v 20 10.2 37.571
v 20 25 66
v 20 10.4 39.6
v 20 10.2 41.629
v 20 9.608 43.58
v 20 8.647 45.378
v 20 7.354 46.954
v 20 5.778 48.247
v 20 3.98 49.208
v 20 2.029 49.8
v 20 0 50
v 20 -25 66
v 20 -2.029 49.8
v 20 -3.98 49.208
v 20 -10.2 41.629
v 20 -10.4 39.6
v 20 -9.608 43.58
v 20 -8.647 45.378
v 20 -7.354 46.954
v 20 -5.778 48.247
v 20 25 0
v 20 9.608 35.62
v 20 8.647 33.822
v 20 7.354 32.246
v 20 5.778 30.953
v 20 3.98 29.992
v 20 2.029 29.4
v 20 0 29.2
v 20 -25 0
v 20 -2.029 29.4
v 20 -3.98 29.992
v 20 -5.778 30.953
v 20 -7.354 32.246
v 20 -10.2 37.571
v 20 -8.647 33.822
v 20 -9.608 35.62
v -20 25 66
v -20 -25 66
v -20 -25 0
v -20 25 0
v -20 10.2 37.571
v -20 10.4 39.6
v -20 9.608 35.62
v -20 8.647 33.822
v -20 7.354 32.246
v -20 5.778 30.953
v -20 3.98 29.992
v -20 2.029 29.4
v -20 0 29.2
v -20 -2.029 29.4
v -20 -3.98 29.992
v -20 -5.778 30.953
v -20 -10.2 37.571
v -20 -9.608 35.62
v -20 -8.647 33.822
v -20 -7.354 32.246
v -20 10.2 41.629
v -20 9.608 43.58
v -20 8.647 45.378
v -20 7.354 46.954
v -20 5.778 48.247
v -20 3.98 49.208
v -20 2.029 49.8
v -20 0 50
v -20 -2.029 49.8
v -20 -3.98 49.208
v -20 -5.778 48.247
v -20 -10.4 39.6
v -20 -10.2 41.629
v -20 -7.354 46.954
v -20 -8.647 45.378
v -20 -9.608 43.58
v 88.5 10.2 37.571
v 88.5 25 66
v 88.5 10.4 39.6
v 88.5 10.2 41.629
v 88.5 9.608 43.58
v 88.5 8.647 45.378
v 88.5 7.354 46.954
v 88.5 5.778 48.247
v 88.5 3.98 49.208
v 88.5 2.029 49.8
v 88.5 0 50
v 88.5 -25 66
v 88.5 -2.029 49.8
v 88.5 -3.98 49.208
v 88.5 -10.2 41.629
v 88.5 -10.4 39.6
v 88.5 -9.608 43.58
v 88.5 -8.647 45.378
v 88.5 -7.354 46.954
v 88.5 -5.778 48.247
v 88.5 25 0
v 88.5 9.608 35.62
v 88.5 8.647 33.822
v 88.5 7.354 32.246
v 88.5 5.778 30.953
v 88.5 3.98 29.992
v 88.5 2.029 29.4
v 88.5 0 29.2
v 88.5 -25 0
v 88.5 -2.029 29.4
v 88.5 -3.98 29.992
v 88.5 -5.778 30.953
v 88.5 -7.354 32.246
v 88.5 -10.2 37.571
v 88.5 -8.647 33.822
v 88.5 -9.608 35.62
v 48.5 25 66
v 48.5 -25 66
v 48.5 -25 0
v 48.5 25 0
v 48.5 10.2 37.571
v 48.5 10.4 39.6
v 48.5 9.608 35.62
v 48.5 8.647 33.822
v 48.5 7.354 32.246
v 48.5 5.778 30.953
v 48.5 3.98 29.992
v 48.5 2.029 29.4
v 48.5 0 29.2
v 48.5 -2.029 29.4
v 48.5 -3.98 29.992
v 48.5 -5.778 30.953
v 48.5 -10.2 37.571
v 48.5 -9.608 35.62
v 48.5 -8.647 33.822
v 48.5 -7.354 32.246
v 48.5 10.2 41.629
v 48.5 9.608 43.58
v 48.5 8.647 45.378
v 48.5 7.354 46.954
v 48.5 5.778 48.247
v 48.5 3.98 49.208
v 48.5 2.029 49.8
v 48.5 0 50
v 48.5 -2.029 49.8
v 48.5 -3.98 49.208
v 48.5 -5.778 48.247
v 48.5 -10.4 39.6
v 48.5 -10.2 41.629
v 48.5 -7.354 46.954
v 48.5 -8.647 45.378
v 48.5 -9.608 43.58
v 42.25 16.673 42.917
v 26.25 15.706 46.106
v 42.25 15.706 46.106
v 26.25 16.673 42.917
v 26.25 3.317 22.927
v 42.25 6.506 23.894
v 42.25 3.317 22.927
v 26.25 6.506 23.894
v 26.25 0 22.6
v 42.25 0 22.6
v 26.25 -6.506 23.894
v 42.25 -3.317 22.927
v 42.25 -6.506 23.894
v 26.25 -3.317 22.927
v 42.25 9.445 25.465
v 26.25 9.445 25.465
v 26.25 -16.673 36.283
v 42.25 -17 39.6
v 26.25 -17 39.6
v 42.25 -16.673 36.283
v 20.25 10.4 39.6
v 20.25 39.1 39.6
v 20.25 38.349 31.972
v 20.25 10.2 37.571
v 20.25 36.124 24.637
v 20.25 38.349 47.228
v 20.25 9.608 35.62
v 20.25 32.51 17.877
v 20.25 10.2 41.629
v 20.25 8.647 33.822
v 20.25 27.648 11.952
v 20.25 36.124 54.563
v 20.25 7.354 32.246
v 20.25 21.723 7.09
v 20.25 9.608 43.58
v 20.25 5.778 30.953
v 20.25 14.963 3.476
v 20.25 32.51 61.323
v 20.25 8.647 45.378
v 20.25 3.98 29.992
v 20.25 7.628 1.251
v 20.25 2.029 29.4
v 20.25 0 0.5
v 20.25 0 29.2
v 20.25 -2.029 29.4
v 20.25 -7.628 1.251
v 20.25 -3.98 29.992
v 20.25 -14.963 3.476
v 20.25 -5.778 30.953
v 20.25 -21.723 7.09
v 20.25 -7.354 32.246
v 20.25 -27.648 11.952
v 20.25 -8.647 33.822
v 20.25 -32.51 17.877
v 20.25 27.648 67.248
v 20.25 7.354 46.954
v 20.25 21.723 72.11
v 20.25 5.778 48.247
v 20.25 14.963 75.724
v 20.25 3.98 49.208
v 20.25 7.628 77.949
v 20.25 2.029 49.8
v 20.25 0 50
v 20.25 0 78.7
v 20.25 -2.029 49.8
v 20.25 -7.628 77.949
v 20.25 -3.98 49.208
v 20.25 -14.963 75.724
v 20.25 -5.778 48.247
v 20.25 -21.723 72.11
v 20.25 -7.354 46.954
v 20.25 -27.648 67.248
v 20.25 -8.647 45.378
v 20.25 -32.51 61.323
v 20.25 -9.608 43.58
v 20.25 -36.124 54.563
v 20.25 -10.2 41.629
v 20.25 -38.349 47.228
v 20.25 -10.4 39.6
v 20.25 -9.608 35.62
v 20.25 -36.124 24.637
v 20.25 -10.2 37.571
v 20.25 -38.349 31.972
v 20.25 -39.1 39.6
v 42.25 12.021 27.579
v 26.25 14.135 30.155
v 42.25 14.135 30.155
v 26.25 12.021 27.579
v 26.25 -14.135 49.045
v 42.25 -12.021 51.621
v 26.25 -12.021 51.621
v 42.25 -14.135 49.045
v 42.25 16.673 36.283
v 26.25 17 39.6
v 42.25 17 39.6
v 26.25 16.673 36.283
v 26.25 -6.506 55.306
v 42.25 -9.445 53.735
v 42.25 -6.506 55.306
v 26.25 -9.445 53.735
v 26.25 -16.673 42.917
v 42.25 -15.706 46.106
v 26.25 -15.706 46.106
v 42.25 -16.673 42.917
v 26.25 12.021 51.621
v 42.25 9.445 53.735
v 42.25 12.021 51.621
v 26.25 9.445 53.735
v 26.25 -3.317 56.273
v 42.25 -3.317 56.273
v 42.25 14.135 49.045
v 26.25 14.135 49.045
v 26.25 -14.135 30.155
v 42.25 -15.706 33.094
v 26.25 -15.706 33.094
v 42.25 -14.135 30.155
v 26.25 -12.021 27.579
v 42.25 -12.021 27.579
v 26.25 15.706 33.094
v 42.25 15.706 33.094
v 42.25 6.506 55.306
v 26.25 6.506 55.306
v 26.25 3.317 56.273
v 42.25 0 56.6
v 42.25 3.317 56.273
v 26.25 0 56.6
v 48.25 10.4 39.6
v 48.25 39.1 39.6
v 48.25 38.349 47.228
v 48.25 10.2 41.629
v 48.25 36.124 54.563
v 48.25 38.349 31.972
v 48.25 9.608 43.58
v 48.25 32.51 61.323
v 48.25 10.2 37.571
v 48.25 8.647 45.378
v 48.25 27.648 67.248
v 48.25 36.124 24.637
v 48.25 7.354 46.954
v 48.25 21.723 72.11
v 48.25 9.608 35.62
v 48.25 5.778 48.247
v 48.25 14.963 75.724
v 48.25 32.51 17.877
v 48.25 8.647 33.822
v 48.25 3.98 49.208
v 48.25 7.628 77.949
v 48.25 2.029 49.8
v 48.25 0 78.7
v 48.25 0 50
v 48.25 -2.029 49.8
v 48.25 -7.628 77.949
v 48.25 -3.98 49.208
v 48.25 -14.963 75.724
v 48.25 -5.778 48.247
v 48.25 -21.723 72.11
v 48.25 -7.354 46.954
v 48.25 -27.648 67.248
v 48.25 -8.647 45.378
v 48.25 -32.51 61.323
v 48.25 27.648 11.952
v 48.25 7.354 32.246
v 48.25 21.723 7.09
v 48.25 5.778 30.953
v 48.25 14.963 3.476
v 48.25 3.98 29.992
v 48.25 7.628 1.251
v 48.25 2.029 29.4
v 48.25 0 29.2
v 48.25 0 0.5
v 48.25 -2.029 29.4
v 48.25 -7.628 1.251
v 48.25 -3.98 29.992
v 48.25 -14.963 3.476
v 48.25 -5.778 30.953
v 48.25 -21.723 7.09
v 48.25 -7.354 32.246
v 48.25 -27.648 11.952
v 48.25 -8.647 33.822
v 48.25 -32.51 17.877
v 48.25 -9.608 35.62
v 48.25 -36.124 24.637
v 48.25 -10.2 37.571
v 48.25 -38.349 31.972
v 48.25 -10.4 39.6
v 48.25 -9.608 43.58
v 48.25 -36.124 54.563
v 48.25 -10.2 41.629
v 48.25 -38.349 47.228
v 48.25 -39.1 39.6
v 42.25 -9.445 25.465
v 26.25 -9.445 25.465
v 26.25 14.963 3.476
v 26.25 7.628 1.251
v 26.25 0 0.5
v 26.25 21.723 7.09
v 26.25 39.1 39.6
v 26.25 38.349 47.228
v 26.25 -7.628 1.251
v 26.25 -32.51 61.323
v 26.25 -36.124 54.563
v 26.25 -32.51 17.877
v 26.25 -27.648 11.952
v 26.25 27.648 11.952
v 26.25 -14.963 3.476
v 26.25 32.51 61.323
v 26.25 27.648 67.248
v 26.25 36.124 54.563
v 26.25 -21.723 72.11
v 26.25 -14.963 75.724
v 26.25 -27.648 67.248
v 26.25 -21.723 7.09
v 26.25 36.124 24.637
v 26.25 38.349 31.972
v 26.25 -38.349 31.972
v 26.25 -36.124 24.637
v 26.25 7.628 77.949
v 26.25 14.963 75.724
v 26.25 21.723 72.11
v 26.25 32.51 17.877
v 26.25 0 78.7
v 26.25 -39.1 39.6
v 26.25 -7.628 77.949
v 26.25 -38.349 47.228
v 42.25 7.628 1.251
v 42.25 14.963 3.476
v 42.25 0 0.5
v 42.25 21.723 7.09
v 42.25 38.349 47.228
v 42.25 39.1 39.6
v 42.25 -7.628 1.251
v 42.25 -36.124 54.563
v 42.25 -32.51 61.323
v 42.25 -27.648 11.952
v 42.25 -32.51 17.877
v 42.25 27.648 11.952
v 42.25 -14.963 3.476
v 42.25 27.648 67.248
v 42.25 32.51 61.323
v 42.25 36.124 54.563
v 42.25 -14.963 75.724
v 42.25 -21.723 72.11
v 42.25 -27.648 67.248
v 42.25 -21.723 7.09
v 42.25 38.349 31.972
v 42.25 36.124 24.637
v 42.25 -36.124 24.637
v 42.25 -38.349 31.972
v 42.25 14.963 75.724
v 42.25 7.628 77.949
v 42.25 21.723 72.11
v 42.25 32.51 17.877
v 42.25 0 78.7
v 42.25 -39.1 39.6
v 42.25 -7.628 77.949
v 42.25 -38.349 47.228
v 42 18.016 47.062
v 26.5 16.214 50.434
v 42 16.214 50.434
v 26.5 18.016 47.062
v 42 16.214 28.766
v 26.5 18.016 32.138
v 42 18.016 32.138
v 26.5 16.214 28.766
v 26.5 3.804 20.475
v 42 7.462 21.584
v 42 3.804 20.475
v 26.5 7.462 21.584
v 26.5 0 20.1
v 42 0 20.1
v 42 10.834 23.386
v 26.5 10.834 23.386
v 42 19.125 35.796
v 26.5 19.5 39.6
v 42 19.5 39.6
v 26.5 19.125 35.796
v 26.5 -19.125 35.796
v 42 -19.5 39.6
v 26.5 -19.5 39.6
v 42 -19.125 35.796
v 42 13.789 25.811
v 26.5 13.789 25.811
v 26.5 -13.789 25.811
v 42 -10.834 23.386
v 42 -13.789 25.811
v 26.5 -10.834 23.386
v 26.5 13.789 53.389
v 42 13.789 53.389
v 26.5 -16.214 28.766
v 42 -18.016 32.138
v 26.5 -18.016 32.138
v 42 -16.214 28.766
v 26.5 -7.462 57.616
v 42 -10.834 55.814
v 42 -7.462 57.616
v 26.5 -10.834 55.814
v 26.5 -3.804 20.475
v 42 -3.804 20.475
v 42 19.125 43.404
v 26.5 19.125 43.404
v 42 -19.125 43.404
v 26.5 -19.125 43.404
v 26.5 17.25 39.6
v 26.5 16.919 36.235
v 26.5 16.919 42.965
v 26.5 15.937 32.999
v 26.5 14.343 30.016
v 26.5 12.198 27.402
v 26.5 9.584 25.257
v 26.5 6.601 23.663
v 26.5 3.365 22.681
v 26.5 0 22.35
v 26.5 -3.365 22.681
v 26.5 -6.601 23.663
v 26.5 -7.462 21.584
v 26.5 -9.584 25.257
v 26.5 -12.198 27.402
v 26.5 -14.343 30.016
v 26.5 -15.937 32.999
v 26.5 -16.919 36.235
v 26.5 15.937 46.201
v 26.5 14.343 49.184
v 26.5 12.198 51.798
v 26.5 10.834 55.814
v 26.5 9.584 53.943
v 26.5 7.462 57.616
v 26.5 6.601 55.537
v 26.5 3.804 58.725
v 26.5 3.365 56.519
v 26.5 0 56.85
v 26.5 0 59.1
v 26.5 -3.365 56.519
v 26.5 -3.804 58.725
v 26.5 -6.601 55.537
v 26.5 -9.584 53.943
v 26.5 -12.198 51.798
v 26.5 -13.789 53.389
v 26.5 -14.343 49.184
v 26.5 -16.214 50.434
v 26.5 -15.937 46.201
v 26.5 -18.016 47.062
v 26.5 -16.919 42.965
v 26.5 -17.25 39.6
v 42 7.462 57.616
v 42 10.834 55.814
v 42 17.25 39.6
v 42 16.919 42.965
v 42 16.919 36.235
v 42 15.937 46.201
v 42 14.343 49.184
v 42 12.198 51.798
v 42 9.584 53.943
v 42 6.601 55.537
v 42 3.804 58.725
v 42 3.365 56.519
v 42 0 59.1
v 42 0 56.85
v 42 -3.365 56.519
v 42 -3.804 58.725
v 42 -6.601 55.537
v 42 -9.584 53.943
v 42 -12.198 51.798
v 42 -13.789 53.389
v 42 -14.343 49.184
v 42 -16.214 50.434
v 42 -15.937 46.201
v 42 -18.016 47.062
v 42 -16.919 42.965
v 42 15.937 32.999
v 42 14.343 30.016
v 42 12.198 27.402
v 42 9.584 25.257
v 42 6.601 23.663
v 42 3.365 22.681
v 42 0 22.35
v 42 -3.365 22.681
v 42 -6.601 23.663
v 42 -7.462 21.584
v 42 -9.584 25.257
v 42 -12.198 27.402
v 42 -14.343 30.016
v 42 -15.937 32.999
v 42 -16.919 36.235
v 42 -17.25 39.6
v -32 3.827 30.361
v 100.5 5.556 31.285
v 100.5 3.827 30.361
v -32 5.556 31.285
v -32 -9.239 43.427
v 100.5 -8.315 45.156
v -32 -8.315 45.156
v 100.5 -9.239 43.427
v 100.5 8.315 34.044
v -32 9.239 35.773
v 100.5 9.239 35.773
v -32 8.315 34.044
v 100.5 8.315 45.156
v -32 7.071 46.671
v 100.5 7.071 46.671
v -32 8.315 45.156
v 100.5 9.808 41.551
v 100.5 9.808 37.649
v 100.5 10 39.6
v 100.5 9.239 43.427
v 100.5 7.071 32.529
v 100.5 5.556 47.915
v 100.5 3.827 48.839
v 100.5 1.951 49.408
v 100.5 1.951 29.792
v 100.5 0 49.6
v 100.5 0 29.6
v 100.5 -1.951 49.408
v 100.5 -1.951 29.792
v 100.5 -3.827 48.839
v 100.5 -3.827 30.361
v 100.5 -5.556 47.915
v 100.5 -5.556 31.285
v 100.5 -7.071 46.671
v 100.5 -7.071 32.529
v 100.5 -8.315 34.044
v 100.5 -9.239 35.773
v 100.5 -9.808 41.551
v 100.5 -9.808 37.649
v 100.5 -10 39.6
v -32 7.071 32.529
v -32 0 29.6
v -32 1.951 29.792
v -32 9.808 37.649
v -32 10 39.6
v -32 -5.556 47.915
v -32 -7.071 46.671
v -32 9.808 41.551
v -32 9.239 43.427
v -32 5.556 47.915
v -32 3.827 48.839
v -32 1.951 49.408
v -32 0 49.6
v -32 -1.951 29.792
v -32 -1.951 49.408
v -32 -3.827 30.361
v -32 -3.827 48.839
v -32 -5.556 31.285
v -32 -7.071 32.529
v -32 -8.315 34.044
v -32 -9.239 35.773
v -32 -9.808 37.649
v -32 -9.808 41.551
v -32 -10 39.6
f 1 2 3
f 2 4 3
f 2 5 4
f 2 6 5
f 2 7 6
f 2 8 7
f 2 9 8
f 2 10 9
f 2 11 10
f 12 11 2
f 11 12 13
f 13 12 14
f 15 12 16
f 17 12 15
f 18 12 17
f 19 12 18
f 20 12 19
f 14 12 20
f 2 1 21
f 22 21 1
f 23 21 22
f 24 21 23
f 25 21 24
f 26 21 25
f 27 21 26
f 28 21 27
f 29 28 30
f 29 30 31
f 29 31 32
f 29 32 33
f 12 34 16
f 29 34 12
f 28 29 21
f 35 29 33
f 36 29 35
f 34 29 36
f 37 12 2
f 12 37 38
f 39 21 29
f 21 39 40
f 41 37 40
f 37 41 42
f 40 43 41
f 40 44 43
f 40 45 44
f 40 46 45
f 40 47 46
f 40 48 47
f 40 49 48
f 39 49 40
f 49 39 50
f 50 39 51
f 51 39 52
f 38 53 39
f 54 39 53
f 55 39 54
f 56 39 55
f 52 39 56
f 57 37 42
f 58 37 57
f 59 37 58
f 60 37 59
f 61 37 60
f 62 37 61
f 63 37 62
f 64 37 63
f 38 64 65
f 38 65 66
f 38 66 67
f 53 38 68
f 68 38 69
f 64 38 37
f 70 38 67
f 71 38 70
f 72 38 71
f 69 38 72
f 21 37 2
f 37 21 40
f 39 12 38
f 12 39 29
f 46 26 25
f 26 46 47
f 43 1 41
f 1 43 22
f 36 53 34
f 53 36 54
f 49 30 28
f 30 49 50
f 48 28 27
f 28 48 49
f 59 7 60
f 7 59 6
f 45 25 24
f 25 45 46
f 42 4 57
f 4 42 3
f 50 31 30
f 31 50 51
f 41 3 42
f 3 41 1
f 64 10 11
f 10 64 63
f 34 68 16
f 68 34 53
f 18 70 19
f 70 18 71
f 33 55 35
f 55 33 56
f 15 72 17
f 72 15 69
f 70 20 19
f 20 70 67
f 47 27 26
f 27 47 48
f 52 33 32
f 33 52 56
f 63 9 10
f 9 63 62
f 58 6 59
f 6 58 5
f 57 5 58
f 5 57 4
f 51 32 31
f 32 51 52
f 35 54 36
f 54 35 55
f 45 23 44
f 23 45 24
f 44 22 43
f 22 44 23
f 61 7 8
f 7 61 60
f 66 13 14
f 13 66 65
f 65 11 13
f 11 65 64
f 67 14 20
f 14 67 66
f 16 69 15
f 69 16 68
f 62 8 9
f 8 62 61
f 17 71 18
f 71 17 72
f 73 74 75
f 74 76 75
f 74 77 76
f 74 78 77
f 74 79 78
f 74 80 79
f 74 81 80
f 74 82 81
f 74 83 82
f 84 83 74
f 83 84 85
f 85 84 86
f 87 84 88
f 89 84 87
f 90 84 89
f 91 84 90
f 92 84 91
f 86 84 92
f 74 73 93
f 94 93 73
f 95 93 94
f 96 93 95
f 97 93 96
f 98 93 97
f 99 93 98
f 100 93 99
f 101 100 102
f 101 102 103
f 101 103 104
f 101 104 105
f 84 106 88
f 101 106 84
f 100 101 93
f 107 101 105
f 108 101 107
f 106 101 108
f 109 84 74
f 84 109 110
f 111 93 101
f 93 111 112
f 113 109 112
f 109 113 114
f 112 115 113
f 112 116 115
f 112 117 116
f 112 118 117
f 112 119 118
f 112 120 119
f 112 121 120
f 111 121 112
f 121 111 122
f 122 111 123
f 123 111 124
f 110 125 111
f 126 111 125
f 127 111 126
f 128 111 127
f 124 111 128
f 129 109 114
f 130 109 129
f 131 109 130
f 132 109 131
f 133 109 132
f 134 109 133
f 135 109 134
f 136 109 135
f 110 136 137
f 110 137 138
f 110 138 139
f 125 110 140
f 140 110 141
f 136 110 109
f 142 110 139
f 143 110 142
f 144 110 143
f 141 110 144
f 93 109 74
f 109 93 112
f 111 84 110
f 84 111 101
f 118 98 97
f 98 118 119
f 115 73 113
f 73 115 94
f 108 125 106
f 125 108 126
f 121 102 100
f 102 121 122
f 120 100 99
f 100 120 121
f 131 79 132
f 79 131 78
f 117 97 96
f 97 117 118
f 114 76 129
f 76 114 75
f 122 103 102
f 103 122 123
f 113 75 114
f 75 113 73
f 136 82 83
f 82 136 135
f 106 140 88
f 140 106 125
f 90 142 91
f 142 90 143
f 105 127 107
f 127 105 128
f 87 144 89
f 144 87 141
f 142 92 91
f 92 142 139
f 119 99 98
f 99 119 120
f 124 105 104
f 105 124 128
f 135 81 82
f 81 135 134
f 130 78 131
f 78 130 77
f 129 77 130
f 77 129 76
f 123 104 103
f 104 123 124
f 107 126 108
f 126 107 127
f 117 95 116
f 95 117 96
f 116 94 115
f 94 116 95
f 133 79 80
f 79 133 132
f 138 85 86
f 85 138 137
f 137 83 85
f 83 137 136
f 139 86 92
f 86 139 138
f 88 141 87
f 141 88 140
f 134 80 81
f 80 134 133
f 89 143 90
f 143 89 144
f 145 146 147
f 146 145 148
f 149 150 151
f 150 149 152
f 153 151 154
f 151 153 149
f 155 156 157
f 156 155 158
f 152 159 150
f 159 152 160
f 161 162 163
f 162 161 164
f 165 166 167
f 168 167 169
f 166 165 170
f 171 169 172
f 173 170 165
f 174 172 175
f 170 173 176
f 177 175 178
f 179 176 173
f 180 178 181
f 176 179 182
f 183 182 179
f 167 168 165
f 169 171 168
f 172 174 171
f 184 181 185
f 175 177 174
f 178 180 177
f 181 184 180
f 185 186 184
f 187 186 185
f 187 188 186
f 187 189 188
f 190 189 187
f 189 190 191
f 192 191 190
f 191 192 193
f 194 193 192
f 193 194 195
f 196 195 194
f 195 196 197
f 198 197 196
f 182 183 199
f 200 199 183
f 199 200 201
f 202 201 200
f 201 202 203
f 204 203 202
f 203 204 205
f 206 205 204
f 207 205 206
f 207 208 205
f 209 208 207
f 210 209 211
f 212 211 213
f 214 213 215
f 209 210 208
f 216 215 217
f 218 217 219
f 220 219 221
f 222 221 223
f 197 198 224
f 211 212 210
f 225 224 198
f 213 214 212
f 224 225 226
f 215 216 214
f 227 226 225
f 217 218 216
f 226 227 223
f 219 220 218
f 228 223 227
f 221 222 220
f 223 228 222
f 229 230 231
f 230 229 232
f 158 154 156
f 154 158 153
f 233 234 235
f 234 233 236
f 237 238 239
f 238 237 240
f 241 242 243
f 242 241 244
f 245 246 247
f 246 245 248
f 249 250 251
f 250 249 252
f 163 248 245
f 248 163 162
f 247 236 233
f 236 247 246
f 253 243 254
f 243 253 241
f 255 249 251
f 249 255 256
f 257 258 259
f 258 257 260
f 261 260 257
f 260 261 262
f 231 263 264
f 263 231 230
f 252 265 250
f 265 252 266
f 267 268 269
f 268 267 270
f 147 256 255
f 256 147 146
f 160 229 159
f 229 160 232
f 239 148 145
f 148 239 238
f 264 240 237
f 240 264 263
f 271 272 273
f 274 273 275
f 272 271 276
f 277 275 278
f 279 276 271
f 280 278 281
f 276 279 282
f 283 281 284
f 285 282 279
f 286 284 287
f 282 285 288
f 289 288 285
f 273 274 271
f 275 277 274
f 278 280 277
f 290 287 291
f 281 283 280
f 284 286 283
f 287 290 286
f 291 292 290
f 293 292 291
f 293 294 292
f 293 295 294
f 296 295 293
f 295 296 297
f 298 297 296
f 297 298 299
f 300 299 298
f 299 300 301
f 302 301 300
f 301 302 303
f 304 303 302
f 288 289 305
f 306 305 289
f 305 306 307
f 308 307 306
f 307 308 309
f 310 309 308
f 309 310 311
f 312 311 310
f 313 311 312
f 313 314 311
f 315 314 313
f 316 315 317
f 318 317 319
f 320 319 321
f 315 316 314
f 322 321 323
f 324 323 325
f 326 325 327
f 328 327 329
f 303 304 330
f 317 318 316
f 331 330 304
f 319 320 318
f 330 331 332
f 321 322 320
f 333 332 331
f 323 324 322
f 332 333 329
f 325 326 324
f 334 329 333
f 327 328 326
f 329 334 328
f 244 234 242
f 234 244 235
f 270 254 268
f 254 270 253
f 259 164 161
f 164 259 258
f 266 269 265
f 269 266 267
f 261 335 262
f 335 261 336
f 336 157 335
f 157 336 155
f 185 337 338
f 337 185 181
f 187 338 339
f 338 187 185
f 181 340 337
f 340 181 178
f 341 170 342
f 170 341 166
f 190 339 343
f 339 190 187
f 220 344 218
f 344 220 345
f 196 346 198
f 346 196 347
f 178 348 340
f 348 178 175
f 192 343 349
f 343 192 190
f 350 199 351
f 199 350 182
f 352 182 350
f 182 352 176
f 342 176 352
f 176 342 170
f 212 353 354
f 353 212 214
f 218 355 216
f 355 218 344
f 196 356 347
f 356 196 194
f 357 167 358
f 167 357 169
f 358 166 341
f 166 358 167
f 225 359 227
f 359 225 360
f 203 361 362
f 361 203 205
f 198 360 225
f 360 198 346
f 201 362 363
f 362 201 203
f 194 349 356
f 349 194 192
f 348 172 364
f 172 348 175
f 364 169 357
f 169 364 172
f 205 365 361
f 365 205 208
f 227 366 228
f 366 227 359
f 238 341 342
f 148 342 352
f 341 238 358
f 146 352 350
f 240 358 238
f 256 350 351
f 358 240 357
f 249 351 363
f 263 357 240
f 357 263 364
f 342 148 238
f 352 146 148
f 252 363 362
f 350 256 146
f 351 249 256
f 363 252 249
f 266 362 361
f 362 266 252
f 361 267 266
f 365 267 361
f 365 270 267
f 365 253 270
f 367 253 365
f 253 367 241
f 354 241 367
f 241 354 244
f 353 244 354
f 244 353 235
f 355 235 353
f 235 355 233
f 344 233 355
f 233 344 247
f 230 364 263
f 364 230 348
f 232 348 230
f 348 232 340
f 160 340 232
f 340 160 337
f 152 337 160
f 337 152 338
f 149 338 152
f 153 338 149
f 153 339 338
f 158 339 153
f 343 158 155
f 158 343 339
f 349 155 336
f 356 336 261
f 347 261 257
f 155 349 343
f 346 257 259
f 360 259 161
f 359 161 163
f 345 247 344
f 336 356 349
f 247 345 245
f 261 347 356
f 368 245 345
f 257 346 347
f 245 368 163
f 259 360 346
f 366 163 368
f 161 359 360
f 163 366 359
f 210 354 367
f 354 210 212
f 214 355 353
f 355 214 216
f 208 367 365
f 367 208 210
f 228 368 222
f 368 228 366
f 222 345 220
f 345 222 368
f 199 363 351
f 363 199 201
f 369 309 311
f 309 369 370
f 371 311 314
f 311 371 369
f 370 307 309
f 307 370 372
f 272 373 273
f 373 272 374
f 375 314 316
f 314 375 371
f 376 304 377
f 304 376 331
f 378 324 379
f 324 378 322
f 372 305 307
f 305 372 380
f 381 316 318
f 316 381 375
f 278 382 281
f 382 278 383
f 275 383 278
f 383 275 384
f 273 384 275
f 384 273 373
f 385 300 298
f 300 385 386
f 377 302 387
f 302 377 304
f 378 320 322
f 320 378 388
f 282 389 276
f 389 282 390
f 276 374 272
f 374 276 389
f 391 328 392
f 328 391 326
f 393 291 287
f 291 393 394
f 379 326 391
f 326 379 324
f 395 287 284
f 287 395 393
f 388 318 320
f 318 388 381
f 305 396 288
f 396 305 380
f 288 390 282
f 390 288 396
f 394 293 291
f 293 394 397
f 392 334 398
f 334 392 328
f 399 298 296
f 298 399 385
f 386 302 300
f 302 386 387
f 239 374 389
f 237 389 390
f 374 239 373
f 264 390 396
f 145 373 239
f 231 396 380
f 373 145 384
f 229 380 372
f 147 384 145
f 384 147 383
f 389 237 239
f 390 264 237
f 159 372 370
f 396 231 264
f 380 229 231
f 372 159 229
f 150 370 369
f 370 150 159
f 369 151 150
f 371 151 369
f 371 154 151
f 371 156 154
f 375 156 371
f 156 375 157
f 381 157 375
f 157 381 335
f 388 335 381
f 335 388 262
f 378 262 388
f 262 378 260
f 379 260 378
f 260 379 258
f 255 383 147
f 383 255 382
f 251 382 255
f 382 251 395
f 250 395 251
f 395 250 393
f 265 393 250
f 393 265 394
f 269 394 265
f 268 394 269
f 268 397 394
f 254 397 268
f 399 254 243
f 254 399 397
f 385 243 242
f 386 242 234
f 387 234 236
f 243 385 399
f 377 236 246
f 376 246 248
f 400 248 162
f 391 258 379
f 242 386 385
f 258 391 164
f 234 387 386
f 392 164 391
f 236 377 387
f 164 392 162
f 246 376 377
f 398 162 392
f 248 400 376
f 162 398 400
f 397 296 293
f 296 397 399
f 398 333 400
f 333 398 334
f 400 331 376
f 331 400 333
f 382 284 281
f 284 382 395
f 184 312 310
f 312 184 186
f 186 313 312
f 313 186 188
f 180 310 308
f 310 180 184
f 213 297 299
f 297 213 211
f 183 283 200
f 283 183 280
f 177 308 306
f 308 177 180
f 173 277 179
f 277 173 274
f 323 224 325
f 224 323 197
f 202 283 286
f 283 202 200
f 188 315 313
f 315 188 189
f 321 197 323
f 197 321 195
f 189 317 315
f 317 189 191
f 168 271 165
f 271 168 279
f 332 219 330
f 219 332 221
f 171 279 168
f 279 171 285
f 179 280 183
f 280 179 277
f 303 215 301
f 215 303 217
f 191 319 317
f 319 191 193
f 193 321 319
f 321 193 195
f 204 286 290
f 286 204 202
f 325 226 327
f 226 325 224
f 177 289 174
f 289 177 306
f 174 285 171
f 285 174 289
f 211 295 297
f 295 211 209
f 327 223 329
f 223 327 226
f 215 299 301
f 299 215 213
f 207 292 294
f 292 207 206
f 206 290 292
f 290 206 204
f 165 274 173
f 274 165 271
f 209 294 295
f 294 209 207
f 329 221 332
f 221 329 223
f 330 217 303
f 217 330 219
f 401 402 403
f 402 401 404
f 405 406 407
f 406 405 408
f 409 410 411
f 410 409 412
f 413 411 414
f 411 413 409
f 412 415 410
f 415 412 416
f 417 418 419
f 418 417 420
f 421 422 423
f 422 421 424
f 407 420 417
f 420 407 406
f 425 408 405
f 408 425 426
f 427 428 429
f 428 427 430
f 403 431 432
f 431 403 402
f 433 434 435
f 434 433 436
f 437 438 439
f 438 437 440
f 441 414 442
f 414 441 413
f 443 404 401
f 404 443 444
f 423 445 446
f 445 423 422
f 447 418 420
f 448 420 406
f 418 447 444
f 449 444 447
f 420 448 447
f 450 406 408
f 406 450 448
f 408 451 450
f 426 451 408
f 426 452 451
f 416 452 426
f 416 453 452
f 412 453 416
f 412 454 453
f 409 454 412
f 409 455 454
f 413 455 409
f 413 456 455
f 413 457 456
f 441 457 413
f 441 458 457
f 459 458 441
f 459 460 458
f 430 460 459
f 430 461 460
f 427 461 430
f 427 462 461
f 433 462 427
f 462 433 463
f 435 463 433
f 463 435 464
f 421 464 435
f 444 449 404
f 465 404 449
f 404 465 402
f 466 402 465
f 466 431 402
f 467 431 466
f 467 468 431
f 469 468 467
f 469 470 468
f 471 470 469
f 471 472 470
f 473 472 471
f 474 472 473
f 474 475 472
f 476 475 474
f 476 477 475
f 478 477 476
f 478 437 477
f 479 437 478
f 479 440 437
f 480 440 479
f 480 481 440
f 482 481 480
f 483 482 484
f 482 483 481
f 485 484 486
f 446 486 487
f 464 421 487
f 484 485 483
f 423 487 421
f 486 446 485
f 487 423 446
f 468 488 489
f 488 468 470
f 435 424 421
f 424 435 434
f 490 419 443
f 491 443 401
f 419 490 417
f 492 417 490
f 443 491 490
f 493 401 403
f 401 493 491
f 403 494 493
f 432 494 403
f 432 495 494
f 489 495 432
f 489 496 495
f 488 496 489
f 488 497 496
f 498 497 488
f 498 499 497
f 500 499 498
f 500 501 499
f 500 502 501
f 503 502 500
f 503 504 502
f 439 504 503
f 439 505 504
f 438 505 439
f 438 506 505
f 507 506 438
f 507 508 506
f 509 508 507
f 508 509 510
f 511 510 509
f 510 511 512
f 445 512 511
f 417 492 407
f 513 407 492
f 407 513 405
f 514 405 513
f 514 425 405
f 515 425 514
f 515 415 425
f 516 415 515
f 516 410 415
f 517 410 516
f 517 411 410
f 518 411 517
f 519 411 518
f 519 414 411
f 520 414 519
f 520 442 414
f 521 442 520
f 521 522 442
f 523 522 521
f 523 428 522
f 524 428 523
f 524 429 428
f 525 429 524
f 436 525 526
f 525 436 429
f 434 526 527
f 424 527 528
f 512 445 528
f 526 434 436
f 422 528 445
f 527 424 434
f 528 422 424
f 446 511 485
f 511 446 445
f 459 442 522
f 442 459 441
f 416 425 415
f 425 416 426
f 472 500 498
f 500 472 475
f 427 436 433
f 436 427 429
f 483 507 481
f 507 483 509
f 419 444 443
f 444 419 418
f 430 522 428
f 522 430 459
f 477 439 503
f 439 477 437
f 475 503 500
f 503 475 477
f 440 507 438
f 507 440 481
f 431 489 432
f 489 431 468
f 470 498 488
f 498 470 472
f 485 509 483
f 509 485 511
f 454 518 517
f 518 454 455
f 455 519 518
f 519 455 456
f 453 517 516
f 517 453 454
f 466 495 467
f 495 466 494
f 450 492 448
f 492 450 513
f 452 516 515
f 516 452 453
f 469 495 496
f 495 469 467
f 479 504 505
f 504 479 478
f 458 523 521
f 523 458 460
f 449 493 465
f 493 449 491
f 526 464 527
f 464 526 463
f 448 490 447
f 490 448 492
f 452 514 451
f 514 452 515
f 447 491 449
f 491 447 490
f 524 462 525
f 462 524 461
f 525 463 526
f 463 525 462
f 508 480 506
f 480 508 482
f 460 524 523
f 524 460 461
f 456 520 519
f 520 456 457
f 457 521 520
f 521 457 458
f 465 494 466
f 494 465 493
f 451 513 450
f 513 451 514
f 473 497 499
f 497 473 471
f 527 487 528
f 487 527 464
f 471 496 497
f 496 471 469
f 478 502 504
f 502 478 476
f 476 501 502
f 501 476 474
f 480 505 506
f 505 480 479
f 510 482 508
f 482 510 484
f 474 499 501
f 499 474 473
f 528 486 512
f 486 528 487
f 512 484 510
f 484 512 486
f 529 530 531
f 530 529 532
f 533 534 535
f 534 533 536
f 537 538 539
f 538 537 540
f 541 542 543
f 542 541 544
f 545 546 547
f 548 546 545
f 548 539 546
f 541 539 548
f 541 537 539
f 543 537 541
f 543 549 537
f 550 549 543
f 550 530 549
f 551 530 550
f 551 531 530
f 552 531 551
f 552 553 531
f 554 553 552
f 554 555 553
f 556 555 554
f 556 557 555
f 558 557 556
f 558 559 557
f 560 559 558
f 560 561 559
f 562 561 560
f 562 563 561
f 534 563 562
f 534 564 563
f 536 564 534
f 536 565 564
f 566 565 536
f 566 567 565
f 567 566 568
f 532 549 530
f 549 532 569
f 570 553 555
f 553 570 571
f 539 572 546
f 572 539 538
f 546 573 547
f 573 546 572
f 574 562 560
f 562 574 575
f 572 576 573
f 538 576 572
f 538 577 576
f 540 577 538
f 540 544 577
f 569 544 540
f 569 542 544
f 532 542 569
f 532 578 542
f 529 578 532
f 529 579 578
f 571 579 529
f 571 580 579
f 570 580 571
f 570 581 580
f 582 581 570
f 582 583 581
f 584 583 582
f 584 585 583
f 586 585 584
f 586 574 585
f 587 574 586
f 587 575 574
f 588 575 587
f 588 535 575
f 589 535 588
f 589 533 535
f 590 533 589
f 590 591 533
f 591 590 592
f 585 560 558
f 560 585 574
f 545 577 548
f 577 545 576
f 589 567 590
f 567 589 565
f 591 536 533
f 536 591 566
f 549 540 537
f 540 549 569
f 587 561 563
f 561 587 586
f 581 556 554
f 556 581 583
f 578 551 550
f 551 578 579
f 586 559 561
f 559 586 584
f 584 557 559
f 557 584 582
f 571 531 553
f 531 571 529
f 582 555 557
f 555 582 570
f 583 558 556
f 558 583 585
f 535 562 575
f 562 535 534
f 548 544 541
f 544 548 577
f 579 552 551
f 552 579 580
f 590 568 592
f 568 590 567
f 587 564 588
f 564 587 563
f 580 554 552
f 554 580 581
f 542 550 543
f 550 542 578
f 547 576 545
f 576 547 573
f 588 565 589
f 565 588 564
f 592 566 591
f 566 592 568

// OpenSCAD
$fn = 32;

// ------------------------------------------------------------------------
// Pulley assembly: d78.2 pulley with a belt, shaft d20
// Every part is its own module, assembly() places them once.
// ------------------------------------------------------------------------

// --- part 1 ---
module support1() {
  difference() {
    translate([-20, -25, 0]) cube([40, 50, 66]);
    translate([0, 0, 39.6]) rotate([0, 90, 0]) cylinder(h = 42, d = 20.8, center = true);
  }
}

// --- part 2 ---
module support2() {
  difference() {
    translate([-20, -25, 0]) cube([40, 50, 66]);
    translate([0, 0, 39.6]) rotate([0, 90, 0]) cylinder(h = 42, d = 20.8, center = true);
  }
}

// --- part 3 ---
module shaft() {
  translate([0, 0, -66.25]) cylinder(h = 132.5, d = 20);
}

// --- part 4 ---
module pulley() {
  difference() {
    union() {
      cylinder(h = 28, d = 34);
      cylinder(h = 6, d = 78.2);
      translate([0, 0, 22]) cylinder(h = 6, d = 78.2);
    }
    translate([0, 0, -1]) cylinder(h = 30, d = 20.8);
  }
}

// --- part 5 ---
module belt() {
  difference() {
      translate([0, 0, 0]) cylinder(h = 15.5, d = 39);
      translate([0, 0, -1]) cylinder(h = 17.5, d = 34.5);
    }
}

// --- assembly ---
module assembly() {
  translate([0, 0, 0]) rotate([0, 0, 0]) support1();
  translate([68.5, 0, 0]) rotate([0, 0, 0]) support2();
  translate([34.25, 0, 39.6]) rotate([0, 90, 0]) shaft();
  translate([20.25, 0, 39.6]) rotate([0, 90, 0]) pulley();
  translate([26.5, 0, 39.6]) rotate([0, 90, 0]) belt();
}

assembly();
